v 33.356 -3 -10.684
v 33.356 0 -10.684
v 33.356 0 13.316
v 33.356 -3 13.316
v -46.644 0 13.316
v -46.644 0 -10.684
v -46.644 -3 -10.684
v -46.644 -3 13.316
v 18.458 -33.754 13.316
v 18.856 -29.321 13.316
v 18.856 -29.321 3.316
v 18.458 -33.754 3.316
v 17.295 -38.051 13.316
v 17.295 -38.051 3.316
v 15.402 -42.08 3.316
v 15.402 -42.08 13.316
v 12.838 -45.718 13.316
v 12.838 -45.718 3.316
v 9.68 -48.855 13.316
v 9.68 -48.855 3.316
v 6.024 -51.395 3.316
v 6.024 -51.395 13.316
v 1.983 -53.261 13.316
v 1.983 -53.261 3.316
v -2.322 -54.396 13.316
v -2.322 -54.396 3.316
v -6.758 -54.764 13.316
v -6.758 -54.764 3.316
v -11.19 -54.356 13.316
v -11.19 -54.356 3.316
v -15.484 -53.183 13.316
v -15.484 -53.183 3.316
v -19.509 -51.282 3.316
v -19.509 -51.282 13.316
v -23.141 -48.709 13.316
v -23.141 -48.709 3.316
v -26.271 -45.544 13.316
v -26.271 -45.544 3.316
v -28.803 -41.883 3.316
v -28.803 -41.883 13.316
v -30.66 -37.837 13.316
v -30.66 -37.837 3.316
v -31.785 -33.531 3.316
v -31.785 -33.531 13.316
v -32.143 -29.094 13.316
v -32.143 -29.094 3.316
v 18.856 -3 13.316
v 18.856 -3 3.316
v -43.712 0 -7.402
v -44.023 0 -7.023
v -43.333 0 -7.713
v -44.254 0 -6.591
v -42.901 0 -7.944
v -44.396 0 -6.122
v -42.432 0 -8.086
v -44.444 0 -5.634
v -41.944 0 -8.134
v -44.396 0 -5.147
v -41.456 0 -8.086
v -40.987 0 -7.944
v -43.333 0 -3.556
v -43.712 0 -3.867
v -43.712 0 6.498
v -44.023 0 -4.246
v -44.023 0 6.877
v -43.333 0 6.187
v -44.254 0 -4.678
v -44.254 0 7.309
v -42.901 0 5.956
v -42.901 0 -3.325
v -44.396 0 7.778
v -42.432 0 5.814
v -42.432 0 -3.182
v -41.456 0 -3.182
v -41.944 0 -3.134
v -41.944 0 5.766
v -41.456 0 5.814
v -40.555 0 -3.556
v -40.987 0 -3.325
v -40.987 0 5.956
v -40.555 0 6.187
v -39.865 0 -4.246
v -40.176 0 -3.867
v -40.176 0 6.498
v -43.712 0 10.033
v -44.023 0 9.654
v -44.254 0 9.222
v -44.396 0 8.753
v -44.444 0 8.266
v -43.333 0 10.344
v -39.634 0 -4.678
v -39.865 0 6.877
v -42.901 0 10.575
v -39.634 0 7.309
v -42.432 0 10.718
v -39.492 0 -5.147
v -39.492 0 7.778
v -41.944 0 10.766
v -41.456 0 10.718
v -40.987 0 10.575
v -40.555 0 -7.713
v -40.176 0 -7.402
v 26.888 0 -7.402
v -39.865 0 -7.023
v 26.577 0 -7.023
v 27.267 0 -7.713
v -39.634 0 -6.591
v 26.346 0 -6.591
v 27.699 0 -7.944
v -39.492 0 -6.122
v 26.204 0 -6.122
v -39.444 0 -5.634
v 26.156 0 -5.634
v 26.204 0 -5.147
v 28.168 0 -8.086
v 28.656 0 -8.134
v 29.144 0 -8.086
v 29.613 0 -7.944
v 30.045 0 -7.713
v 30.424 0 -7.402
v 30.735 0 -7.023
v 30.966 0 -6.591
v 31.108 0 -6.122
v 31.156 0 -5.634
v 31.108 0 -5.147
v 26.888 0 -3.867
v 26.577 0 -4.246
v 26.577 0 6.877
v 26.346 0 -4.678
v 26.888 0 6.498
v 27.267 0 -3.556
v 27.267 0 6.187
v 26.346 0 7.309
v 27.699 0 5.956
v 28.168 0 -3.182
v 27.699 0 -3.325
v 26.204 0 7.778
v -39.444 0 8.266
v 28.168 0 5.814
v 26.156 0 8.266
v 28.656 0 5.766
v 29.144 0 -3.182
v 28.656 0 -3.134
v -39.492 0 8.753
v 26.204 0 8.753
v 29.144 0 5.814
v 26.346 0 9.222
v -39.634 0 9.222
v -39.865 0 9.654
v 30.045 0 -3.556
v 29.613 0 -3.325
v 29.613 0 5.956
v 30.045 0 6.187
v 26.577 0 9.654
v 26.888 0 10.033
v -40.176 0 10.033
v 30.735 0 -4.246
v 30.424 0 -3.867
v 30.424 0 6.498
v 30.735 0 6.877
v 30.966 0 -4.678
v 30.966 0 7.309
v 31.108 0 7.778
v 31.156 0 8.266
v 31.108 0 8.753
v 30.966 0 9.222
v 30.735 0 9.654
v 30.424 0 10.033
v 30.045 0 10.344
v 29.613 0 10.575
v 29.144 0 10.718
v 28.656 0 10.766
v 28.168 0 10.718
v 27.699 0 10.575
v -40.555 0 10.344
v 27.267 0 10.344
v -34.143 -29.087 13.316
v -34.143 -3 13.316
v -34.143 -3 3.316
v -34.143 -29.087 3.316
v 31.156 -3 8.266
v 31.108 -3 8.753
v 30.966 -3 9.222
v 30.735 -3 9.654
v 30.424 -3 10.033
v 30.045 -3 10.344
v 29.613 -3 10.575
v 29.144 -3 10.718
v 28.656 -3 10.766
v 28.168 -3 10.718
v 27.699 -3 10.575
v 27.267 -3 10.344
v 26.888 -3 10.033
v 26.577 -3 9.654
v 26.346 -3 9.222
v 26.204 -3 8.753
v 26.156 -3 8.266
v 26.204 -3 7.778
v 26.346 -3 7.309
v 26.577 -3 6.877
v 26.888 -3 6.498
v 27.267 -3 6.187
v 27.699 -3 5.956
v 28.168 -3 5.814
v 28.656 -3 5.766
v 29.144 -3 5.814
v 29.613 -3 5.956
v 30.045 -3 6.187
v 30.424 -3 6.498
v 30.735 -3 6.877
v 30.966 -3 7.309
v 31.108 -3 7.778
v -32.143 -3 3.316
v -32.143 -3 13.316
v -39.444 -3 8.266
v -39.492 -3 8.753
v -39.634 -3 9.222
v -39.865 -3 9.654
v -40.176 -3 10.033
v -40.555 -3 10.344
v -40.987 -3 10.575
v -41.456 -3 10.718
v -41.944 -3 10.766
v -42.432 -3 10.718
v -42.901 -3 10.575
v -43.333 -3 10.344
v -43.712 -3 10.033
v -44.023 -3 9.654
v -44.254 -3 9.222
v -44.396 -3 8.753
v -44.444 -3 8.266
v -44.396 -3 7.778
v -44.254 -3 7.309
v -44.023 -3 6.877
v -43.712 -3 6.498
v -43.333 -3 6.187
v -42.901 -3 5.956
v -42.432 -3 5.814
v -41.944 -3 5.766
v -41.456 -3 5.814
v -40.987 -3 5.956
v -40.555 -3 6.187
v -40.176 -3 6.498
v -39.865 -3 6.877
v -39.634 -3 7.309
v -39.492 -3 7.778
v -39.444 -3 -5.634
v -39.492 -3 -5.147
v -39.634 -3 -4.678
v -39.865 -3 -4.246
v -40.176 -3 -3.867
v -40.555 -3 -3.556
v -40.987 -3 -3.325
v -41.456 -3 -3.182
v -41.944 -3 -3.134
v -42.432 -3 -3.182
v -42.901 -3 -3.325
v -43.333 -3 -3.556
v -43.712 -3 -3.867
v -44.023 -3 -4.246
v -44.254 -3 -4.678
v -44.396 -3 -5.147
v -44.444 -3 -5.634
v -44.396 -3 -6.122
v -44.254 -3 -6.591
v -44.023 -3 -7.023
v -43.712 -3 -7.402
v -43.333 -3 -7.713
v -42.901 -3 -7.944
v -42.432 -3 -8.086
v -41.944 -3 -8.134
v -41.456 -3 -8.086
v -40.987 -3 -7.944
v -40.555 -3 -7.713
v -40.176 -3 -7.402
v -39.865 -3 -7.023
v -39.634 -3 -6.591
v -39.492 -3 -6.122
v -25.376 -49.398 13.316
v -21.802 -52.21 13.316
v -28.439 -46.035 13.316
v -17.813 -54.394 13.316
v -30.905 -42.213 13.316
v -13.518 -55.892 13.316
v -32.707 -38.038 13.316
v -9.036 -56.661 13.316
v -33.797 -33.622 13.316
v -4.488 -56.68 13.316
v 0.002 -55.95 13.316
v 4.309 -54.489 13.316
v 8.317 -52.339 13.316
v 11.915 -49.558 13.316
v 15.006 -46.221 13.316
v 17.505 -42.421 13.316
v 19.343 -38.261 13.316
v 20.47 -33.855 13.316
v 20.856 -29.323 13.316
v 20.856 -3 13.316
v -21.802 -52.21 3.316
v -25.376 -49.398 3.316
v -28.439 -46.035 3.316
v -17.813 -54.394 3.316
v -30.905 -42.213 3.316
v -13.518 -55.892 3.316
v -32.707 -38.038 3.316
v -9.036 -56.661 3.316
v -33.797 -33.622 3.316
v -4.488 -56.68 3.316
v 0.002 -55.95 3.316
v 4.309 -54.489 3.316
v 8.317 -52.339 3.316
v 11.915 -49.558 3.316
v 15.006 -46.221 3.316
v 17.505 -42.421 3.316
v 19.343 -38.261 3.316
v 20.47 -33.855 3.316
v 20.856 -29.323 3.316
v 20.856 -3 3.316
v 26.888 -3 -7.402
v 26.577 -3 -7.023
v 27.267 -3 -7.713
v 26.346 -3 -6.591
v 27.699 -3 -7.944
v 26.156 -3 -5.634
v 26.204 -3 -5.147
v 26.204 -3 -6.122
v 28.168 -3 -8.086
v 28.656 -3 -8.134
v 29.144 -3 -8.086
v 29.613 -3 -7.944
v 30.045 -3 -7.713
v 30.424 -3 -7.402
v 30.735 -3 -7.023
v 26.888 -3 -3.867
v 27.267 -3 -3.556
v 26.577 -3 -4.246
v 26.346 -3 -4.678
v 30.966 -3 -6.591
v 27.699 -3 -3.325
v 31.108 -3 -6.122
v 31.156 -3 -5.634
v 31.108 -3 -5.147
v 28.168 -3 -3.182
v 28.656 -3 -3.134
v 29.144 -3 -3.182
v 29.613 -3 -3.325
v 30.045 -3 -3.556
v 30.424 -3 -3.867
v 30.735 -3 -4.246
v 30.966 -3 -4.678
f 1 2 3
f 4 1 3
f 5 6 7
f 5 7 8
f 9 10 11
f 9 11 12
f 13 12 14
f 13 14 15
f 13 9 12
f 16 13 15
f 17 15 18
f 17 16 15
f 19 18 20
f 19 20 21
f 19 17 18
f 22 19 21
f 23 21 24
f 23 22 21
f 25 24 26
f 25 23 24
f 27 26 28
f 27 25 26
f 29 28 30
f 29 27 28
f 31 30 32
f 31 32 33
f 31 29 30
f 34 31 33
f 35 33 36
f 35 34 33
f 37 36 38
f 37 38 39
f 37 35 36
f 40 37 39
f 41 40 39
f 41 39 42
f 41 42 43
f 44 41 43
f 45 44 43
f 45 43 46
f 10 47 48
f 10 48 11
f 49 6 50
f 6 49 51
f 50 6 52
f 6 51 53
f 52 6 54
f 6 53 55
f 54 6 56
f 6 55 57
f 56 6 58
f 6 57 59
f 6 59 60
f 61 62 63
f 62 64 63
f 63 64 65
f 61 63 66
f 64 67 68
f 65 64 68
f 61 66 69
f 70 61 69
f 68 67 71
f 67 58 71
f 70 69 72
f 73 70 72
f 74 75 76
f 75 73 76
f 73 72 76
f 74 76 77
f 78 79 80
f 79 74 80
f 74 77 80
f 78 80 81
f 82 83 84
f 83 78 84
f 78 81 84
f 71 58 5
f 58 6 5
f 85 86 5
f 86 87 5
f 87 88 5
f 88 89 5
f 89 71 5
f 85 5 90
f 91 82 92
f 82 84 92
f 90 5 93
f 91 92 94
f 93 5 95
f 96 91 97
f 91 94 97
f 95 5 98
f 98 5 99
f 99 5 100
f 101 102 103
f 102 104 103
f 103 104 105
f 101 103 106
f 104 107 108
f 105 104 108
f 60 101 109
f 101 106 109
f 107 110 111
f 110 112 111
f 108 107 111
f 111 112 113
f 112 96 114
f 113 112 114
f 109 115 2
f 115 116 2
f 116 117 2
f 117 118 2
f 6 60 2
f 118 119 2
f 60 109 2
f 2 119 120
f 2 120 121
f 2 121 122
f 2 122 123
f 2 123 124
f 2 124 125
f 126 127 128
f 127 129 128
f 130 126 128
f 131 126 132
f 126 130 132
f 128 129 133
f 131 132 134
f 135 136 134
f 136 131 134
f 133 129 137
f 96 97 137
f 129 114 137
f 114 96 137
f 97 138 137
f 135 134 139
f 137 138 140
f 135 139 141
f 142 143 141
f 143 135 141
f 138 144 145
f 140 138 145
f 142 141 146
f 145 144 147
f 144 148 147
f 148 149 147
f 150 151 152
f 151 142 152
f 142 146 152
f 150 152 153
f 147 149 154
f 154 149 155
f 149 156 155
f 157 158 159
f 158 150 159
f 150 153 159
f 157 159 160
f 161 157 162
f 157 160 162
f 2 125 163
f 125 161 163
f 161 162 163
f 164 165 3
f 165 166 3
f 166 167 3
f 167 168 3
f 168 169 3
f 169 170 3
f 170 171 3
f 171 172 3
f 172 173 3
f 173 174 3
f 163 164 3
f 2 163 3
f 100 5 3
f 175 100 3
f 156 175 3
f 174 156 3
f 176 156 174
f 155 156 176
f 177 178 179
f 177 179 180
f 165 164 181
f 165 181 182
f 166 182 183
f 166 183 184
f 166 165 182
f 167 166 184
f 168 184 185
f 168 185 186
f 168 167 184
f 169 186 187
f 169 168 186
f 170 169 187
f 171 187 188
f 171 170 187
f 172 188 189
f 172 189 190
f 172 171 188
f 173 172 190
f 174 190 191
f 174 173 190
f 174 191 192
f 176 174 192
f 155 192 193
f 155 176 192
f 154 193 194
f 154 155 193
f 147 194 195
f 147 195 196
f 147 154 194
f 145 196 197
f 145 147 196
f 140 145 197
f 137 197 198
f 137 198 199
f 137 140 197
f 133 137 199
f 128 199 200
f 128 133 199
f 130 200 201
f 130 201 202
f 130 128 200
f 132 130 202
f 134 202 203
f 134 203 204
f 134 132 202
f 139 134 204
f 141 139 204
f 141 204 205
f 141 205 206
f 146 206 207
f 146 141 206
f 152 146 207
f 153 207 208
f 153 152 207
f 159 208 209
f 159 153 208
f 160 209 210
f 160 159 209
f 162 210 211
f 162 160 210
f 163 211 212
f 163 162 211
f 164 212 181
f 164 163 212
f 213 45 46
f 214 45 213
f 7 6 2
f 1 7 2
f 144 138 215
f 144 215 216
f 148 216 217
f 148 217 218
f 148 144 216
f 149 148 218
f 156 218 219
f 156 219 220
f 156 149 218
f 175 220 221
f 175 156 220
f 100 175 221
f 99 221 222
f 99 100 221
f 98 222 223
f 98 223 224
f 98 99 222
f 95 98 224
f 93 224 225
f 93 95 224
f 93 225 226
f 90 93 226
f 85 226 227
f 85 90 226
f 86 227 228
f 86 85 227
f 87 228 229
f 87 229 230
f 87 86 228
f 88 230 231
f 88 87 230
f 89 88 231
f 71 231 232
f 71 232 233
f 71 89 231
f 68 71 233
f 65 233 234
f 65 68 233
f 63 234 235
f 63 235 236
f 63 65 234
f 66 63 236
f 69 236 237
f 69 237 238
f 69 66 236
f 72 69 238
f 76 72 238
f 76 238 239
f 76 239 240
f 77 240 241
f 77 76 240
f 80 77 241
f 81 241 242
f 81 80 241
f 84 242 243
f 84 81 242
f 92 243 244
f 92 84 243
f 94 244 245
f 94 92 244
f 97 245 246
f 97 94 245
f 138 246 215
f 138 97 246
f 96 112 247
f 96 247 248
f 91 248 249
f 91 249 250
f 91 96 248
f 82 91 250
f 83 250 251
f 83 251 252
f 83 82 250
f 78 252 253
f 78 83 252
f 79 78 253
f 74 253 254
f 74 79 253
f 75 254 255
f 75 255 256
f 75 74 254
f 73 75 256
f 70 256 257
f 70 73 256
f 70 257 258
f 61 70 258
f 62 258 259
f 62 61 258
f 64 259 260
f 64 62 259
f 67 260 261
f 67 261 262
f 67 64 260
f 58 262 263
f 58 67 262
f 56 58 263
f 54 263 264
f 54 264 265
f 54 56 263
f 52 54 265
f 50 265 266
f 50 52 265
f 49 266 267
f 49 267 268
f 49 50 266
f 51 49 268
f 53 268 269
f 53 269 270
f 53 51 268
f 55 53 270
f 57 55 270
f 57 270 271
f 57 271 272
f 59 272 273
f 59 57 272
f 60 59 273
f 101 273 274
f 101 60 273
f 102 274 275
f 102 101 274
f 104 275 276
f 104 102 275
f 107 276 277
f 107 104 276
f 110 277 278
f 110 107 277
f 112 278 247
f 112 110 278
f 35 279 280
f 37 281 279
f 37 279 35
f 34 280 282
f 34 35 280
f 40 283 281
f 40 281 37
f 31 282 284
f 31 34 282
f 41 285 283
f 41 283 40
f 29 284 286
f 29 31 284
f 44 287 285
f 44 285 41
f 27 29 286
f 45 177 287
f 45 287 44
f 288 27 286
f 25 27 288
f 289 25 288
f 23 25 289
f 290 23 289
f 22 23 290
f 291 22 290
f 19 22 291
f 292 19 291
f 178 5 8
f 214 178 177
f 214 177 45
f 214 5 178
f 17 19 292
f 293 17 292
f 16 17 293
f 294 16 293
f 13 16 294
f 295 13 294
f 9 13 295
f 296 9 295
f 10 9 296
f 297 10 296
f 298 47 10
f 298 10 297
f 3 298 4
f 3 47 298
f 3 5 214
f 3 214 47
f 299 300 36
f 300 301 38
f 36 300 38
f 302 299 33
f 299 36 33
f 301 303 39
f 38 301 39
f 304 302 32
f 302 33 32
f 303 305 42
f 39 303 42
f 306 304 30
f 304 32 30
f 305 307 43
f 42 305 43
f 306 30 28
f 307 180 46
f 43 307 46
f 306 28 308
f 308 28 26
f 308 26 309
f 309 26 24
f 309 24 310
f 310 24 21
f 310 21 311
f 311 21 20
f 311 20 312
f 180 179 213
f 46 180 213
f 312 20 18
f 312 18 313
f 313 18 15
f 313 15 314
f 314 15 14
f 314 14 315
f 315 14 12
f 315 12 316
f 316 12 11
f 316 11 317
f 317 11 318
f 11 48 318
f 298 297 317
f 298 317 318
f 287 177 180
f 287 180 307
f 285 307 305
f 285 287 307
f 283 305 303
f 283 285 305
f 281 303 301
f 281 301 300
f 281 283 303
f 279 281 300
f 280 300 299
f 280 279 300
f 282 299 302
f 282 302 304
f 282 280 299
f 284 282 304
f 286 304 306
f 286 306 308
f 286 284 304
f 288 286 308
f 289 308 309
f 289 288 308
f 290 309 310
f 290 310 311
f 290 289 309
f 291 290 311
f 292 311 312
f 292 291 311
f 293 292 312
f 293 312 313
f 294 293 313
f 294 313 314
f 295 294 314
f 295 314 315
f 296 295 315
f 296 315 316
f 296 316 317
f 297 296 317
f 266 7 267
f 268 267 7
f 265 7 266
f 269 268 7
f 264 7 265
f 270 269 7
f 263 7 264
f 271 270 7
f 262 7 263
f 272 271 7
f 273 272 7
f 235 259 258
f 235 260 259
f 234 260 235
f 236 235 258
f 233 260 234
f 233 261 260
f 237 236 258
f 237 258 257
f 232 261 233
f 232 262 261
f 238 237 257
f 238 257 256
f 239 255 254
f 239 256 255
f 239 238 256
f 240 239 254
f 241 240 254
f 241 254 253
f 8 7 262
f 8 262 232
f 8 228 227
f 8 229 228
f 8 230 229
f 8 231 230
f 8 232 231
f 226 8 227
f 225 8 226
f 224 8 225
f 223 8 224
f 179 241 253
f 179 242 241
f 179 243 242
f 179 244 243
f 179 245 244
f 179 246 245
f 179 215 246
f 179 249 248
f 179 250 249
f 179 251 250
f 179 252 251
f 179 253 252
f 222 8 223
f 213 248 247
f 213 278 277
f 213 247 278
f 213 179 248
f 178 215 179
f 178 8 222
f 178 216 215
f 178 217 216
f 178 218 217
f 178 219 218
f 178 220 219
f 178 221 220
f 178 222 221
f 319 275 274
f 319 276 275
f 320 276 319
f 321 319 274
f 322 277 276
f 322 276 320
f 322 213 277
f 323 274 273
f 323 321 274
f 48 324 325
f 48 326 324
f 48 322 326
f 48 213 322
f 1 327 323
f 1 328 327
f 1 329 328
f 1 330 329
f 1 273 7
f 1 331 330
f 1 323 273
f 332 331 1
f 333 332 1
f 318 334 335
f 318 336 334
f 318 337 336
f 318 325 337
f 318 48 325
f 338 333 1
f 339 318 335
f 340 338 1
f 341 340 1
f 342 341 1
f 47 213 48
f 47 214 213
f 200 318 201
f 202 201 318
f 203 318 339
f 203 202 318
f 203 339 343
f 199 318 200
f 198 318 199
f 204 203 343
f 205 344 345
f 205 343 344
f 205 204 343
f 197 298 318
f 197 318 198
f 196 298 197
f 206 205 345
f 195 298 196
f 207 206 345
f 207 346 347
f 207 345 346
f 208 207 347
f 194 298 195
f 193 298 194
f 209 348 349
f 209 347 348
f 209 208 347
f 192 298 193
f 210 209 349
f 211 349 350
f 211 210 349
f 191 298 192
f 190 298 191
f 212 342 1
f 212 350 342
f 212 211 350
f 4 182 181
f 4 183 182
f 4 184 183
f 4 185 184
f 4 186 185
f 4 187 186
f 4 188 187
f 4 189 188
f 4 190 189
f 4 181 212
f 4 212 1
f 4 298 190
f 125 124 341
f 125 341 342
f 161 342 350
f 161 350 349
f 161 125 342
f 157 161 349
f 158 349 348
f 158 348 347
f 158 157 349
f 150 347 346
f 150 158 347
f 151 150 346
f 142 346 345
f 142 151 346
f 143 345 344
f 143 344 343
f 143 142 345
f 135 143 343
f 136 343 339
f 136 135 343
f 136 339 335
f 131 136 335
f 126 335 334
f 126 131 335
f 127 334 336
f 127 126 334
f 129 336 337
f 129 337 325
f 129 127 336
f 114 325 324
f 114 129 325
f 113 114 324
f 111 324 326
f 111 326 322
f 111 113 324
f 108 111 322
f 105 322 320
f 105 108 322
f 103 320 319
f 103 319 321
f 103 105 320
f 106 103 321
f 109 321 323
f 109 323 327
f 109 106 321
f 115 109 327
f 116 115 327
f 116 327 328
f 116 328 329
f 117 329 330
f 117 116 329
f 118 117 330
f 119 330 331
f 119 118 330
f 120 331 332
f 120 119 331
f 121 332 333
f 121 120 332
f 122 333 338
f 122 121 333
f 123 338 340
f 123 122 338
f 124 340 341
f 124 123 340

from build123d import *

# Parameters (mm, degrees)
F0_W     = 80
F0_H     = 24
F0_R     = 2.5
F1_DEPTH = 3
F3_DEPTH = 10


with BuildPart() as f1:
    # F0 (on Front) → F1 (new body)
    with BuildSketch(Plane.XZ):
        with Locations((-6.643935, 1.315546)):
            Rectangle(F0_W, F0_H)
        with Locations((-41.943935, -5.634454)):
            Circle(F0_R, mode=Mode.SUBTRACT)
        with Locations((28.656065, -5.634454)):
            Circle(F0_R, mode=Mode.SUBTRACT)
        with Locations((-41.943935, 8.265546)):
            Circle(F0_R, mode=Mode.SUBTRACT)
        with Locations((28.656065, 8.265546)):
            Circle(F0_R, mode=Mode.SUBTRACT)
    extrude(amount=F1_DEPTH)

    # F2 (on face) → F3 (join)
    with BuildSketch(Plane.XY.offset(13.315546)):
        with BuildLine():
            ThreePointArc((18.856003, -29.321047), (-6.757583, -54.764478), (-32.143362, -29.093751))
            Line((-32.143362, -29.093751), (-32.143362, -3))
            Line((-32.143362, -3), (-34.143362, -3))
            Line((-34.143362, -3), (-34.143362, -29.087173))
            ThreePointArc((-34.143362, -29.087173), (-6.761956, -56.764478), (20.856003, -29.323214))
            Line((20.856003, -29.323214), (20.856003, -3))
            Line((20.856003, -3), (18.856003, -3))
            Line((18.856003, -3), (18.856003, -29.321047))
        make_face()
    extrude(amount=-F3_DEPTH)


solid = f1.part
